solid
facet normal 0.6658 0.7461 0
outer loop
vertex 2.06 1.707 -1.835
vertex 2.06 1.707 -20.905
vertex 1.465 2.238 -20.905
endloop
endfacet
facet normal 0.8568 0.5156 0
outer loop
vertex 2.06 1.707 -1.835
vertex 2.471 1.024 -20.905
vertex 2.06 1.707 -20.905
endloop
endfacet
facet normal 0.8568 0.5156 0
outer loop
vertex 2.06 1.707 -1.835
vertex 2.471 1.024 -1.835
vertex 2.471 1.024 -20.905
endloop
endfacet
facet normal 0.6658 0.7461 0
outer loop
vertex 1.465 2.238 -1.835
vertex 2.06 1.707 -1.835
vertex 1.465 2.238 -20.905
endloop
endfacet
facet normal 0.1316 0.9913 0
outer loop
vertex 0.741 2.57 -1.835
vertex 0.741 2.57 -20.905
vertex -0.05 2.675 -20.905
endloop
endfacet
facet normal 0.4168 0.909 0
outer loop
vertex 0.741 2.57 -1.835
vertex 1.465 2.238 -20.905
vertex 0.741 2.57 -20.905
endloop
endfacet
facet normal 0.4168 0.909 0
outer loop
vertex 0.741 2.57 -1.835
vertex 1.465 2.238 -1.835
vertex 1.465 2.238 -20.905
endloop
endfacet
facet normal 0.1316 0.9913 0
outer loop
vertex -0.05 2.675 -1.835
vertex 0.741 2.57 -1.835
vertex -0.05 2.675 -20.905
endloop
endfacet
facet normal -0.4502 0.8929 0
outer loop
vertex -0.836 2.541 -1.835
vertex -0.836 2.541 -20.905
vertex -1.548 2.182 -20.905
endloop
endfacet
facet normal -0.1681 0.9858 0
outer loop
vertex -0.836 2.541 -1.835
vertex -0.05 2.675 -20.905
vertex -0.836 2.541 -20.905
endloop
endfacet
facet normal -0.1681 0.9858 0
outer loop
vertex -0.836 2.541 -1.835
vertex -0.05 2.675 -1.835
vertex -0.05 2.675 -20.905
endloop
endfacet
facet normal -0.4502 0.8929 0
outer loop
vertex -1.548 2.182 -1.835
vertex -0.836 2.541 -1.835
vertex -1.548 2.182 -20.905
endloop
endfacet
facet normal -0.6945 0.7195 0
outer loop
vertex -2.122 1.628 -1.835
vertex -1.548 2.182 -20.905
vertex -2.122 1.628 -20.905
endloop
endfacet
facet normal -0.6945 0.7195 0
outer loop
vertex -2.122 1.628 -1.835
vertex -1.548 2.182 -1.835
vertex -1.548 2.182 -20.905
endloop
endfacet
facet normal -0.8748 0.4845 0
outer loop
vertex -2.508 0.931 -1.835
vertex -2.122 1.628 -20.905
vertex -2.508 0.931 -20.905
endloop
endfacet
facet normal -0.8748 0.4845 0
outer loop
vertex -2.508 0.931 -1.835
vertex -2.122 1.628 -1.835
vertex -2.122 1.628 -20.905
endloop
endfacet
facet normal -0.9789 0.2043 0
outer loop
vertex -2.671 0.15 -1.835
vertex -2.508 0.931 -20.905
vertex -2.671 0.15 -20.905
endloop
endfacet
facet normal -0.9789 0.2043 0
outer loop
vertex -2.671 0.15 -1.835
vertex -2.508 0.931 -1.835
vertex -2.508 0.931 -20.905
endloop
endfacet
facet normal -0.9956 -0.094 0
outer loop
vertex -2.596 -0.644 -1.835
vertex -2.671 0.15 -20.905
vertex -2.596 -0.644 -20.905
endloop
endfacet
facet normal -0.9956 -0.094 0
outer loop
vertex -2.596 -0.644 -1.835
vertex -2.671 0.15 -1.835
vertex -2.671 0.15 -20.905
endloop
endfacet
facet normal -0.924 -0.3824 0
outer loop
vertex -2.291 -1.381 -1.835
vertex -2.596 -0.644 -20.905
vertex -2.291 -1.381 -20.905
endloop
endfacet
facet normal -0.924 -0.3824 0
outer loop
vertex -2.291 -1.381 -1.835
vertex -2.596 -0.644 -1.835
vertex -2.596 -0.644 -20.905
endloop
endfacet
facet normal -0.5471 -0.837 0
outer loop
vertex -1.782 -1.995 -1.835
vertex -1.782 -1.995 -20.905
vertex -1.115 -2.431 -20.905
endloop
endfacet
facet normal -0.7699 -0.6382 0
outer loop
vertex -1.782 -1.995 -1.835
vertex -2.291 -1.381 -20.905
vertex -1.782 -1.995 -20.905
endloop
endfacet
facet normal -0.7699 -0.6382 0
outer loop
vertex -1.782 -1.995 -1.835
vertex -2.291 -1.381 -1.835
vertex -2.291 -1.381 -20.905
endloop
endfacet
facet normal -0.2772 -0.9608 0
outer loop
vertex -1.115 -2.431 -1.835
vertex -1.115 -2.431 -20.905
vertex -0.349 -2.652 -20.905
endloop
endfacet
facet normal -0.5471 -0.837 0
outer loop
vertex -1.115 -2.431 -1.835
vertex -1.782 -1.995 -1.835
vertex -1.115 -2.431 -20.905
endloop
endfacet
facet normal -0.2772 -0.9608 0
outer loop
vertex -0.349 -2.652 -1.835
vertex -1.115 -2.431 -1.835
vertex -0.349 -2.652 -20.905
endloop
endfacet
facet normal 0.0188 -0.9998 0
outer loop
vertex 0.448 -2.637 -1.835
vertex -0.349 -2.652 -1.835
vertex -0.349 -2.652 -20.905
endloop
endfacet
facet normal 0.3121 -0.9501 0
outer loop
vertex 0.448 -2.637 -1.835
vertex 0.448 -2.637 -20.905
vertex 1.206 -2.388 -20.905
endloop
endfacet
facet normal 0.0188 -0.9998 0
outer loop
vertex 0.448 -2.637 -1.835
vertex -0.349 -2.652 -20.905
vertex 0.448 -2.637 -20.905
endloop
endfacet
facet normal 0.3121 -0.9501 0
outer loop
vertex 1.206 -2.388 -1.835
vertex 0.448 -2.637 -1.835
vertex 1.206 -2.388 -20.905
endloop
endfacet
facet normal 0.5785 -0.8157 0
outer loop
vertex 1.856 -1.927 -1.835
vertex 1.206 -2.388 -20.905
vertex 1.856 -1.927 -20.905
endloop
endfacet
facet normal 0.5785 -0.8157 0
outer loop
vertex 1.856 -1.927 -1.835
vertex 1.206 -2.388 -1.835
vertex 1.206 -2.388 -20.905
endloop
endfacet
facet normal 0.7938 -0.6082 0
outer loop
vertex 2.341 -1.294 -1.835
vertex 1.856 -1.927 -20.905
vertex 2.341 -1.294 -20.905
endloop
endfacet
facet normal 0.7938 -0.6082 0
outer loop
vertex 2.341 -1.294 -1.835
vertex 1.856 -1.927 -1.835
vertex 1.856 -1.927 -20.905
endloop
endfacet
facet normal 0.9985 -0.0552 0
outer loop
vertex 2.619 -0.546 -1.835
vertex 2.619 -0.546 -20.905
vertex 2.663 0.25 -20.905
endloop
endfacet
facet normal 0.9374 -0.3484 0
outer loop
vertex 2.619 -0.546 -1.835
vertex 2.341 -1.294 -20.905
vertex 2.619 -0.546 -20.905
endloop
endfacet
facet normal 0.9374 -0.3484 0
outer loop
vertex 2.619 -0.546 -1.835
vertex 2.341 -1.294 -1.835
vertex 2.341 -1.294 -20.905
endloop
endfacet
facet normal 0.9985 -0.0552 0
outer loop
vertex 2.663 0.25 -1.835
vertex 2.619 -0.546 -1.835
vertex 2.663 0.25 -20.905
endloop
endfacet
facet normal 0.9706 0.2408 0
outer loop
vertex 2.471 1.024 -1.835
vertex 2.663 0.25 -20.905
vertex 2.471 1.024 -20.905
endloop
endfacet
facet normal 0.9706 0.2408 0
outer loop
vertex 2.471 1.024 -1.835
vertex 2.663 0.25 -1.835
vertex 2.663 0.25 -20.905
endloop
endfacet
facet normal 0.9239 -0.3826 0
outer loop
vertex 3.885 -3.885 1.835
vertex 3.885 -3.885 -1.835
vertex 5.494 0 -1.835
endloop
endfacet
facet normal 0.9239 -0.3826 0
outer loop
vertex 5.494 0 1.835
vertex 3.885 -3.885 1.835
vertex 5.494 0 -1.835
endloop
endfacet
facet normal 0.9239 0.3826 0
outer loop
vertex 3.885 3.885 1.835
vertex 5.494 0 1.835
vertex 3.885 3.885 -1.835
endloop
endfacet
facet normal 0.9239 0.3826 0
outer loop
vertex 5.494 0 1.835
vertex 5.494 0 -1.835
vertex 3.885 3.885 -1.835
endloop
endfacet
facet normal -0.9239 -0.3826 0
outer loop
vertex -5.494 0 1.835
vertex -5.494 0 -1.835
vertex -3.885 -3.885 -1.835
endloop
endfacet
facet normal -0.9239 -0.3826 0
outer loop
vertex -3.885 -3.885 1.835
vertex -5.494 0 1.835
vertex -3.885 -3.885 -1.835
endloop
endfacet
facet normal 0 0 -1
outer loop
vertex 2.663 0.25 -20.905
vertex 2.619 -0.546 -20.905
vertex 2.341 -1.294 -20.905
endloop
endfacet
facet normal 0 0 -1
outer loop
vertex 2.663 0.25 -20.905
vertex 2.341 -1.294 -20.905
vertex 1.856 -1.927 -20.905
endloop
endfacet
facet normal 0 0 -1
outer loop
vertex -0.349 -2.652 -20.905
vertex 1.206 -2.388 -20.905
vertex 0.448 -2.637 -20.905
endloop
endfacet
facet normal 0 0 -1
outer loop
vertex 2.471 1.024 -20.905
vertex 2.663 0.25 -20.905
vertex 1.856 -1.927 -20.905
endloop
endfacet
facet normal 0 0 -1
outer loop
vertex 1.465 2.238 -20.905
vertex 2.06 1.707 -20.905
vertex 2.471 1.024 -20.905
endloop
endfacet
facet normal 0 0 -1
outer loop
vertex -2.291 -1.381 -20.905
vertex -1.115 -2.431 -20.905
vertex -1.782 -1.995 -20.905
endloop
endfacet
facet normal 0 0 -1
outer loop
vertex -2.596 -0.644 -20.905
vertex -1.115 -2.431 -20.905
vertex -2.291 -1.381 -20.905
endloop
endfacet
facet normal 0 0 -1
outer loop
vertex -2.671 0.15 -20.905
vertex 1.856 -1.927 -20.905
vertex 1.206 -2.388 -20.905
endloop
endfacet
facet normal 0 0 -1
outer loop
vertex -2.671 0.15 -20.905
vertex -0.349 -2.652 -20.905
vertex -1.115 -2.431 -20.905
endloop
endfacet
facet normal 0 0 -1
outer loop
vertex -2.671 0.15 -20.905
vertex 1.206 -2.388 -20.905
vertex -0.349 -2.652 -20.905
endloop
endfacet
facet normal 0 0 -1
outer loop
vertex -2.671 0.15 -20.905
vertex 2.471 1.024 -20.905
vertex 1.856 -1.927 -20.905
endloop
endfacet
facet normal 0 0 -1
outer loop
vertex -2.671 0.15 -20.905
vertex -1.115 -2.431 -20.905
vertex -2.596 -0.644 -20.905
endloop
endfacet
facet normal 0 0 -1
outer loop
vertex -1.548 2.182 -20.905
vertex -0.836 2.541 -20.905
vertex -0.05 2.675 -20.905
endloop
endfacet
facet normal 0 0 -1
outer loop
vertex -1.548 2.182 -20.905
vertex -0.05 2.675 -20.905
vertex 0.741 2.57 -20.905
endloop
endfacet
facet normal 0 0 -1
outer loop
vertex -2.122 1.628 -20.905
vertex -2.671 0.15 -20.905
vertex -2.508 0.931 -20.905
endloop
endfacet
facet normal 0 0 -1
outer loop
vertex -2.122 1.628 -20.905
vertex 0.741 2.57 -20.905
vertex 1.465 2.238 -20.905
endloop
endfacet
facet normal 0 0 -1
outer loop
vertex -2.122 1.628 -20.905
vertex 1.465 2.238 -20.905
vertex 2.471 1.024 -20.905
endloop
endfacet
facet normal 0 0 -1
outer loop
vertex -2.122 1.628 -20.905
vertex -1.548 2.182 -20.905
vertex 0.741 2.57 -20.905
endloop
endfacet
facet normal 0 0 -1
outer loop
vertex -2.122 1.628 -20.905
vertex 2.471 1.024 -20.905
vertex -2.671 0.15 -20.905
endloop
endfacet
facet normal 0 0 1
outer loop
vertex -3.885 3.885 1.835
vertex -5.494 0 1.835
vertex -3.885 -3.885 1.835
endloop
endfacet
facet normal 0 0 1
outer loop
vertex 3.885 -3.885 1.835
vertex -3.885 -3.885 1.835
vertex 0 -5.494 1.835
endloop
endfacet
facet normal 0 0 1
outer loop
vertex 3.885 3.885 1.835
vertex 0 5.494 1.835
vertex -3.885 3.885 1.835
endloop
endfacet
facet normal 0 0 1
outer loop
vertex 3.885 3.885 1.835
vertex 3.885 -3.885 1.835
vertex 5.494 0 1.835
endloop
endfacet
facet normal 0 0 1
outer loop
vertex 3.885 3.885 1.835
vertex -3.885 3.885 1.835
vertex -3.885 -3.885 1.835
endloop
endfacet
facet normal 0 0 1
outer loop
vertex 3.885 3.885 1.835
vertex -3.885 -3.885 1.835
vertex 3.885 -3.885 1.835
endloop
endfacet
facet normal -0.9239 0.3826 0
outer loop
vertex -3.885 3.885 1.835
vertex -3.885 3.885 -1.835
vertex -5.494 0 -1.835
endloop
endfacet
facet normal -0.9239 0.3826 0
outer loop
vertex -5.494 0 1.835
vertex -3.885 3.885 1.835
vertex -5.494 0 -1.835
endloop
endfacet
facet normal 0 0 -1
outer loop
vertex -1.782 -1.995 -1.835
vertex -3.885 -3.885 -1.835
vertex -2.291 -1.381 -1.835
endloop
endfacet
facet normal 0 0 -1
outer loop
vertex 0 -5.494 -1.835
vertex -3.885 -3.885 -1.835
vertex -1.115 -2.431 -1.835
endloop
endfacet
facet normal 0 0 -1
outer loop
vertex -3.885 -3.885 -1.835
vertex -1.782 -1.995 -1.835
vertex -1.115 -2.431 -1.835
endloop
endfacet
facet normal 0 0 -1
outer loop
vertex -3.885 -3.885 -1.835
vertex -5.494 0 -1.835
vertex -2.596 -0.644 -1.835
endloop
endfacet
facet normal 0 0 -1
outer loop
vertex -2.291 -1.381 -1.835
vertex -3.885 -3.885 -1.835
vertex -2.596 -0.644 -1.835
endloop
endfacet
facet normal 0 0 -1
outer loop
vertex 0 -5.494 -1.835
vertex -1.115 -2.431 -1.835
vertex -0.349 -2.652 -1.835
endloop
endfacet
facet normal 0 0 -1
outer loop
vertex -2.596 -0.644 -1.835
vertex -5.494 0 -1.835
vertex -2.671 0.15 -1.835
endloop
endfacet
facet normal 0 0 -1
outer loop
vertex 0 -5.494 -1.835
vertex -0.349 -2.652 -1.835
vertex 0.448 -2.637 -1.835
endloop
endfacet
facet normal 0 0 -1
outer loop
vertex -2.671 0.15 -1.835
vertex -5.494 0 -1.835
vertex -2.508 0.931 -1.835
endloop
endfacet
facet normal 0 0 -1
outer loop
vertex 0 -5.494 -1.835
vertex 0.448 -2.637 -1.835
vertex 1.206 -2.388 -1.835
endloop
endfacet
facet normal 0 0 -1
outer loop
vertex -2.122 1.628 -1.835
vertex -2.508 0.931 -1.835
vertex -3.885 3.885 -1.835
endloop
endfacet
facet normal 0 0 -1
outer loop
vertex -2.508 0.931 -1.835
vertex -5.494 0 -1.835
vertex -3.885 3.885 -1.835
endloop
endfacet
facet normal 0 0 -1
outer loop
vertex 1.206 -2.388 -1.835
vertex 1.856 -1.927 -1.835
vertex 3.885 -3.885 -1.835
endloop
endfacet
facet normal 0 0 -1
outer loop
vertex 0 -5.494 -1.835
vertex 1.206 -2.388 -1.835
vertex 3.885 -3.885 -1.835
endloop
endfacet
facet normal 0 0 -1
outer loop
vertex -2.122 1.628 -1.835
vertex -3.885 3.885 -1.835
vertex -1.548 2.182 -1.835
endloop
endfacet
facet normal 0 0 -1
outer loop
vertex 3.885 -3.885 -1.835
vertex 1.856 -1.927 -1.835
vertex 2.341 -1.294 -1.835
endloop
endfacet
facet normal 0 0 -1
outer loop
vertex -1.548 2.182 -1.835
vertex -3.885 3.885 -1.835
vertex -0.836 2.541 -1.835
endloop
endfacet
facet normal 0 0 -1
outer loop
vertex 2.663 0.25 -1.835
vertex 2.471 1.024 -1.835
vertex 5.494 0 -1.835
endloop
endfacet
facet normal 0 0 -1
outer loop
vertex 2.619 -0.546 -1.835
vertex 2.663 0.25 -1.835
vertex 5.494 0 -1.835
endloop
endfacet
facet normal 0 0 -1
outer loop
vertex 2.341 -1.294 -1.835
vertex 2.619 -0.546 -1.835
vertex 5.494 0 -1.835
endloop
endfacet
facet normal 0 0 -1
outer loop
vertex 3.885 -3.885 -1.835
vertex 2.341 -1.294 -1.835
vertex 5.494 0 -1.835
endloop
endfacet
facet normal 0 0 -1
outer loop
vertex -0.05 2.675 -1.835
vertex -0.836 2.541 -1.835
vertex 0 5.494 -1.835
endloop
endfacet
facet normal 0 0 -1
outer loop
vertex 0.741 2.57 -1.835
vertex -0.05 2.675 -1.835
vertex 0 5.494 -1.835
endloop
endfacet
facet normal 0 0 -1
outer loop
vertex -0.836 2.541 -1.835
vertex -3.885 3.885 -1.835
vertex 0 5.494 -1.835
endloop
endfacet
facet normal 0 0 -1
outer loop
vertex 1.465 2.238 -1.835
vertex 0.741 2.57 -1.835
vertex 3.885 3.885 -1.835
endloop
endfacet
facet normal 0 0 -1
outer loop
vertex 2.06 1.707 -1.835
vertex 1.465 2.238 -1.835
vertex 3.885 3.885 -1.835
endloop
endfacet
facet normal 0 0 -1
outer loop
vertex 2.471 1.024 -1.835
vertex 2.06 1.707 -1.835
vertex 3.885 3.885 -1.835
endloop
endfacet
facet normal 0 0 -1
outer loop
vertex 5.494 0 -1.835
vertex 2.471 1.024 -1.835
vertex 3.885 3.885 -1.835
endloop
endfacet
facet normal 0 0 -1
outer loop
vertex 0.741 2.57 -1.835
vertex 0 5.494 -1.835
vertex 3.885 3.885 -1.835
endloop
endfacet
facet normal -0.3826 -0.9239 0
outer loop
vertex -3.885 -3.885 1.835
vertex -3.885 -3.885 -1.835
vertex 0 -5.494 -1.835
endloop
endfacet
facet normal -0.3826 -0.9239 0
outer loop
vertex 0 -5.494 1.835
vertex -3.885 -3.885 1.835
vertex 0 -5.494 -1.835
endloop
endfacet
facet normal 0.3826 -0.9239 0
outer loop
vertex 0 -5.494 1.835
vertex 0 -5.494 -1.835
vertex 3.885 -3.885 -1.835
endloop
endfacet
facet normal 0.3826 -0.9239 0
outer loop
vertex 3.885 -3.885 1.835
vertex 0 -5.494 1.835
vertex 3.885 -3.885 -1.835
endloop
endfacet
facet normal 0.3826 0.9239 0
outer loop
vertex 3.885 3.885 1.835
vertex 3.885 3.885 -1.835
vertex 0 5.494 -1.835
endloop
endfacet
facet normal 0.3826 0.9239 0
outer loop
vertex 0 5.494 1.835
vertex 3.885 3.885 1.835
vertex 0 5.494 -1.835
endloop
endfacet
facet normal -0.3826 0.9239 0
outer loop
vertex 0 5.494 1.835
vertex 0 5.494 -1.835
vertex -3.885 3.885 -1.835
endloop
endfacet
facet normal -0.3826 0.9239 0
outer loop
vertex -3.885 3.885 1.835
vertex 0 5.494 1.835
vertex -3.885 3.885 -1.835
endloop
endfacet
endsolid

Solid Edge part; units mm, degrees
sketch "Sketch1" plane through (0, 0, 0) normal (0, 0, 1) x (1, 0, 0)
  line L0 (-5.494, 0) -> (-3.8848, -3.8848)
  line L1 (-3.8848, -3.8848) -> (0, -5.494)
  line L2 (0, -5.494) -> (3.8848, -3.8848)
  line L3 (3.8848, -3.8848) -> (5.494, 0)
  line L4 (5.494, 0) -> (3.8848, 3.8848)
  line L5 (3.8848, 3.8848) -> (0, 5.494)
  line L6 (0, 5.494) -> (-3.8848, 3.8848)
  line L7 (-3.8848, 3.8848) -> (-5.494, 0)
extrude "Protrusion1" add sketch "Sketch1" along normal mid plane 3.67
sketch "Sketch2" plane through (0, 0, -1.835) normal (0, 0, -1) x (0.9239, 0.3827, 0)
  circle A0 centre (0, 0) radius 2.675
extrude "ExtrudedProtrusion_2" add sketch "Sketch2" along normal blind 19.07
